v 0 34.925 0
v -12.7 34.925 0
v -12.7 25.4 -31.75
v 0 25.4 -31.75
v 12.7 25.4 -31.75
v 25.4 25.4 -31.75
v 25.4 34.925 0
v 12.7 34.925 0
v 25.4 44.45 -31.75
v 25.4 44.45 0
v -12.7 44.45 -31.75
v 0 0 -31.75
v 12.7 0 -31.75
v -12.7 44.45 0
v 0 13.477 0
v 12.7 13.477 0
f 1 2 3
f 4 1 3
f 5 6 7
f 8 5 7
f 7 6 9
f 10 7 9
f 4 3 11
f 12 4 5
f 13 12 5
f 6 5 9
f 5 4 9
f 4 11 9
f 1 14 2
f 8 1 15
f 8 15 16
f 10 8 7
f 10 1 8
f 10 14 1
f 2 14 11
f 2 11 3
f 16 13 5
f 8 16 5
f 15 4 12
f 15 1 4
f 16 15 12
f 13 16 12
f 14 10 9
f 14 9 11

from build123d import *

# Parameters (mm, degrees)
F1_DEPTH = 31.75
F3_DEPTH = 12.7
F5_DEPTH = 12.7
F7_DEPTH = 12.7


with BuildPart() as f1:
    # F0 (on Top) → F1 (new body)
    with BuildSketch(Plane.XY):
        Polygon((0, 25.4), (0, 0), (12.7, 0), (12.7, 25.4), (25.4, 25.4), (25.4, 44.45), (-12.7, 44.45), (-12.7, 25.4), align=None)
    extrude(amount=-F1_DEPTH)

    # F2 (on face) → F3 (cut)
    with BuildSketch(Plane(origin=(-12.7, 0, 0), x_dir=(0, -1, 0), z_dir=(-1, 0, 0))):
        Polygon((-34.925, 0), (-25.4, -31.75), (-25.4, 0), align=None)
    extrude(amount=-F3_DEPTH, mode=Mode.SUBTRACT)

    # F4 (on face) → F5 (cut)
    with BuildSketch(Plane(origin=(0, 0, 0), x_dir=(0, -1, 0), z_dir=(-1, 0, 0))):
        Polygon((-13.476862, 0), (0, -31.75), (0, 0), align=None)
    extrude(amount=-F5_DEPTH, mode=Mode.SUBTRACT)

    # F6 (on face) → F7 (cut)
    with BuildSketch(Plane.YZ.offset(25.4)):
        Polygon((25.4, -31.75), (34.925, 0), (25.4, 0), align=None)
    extrude(amount=-F7_DEPTH, mode=Mode.SUBTRACT)


solid = f1.part
